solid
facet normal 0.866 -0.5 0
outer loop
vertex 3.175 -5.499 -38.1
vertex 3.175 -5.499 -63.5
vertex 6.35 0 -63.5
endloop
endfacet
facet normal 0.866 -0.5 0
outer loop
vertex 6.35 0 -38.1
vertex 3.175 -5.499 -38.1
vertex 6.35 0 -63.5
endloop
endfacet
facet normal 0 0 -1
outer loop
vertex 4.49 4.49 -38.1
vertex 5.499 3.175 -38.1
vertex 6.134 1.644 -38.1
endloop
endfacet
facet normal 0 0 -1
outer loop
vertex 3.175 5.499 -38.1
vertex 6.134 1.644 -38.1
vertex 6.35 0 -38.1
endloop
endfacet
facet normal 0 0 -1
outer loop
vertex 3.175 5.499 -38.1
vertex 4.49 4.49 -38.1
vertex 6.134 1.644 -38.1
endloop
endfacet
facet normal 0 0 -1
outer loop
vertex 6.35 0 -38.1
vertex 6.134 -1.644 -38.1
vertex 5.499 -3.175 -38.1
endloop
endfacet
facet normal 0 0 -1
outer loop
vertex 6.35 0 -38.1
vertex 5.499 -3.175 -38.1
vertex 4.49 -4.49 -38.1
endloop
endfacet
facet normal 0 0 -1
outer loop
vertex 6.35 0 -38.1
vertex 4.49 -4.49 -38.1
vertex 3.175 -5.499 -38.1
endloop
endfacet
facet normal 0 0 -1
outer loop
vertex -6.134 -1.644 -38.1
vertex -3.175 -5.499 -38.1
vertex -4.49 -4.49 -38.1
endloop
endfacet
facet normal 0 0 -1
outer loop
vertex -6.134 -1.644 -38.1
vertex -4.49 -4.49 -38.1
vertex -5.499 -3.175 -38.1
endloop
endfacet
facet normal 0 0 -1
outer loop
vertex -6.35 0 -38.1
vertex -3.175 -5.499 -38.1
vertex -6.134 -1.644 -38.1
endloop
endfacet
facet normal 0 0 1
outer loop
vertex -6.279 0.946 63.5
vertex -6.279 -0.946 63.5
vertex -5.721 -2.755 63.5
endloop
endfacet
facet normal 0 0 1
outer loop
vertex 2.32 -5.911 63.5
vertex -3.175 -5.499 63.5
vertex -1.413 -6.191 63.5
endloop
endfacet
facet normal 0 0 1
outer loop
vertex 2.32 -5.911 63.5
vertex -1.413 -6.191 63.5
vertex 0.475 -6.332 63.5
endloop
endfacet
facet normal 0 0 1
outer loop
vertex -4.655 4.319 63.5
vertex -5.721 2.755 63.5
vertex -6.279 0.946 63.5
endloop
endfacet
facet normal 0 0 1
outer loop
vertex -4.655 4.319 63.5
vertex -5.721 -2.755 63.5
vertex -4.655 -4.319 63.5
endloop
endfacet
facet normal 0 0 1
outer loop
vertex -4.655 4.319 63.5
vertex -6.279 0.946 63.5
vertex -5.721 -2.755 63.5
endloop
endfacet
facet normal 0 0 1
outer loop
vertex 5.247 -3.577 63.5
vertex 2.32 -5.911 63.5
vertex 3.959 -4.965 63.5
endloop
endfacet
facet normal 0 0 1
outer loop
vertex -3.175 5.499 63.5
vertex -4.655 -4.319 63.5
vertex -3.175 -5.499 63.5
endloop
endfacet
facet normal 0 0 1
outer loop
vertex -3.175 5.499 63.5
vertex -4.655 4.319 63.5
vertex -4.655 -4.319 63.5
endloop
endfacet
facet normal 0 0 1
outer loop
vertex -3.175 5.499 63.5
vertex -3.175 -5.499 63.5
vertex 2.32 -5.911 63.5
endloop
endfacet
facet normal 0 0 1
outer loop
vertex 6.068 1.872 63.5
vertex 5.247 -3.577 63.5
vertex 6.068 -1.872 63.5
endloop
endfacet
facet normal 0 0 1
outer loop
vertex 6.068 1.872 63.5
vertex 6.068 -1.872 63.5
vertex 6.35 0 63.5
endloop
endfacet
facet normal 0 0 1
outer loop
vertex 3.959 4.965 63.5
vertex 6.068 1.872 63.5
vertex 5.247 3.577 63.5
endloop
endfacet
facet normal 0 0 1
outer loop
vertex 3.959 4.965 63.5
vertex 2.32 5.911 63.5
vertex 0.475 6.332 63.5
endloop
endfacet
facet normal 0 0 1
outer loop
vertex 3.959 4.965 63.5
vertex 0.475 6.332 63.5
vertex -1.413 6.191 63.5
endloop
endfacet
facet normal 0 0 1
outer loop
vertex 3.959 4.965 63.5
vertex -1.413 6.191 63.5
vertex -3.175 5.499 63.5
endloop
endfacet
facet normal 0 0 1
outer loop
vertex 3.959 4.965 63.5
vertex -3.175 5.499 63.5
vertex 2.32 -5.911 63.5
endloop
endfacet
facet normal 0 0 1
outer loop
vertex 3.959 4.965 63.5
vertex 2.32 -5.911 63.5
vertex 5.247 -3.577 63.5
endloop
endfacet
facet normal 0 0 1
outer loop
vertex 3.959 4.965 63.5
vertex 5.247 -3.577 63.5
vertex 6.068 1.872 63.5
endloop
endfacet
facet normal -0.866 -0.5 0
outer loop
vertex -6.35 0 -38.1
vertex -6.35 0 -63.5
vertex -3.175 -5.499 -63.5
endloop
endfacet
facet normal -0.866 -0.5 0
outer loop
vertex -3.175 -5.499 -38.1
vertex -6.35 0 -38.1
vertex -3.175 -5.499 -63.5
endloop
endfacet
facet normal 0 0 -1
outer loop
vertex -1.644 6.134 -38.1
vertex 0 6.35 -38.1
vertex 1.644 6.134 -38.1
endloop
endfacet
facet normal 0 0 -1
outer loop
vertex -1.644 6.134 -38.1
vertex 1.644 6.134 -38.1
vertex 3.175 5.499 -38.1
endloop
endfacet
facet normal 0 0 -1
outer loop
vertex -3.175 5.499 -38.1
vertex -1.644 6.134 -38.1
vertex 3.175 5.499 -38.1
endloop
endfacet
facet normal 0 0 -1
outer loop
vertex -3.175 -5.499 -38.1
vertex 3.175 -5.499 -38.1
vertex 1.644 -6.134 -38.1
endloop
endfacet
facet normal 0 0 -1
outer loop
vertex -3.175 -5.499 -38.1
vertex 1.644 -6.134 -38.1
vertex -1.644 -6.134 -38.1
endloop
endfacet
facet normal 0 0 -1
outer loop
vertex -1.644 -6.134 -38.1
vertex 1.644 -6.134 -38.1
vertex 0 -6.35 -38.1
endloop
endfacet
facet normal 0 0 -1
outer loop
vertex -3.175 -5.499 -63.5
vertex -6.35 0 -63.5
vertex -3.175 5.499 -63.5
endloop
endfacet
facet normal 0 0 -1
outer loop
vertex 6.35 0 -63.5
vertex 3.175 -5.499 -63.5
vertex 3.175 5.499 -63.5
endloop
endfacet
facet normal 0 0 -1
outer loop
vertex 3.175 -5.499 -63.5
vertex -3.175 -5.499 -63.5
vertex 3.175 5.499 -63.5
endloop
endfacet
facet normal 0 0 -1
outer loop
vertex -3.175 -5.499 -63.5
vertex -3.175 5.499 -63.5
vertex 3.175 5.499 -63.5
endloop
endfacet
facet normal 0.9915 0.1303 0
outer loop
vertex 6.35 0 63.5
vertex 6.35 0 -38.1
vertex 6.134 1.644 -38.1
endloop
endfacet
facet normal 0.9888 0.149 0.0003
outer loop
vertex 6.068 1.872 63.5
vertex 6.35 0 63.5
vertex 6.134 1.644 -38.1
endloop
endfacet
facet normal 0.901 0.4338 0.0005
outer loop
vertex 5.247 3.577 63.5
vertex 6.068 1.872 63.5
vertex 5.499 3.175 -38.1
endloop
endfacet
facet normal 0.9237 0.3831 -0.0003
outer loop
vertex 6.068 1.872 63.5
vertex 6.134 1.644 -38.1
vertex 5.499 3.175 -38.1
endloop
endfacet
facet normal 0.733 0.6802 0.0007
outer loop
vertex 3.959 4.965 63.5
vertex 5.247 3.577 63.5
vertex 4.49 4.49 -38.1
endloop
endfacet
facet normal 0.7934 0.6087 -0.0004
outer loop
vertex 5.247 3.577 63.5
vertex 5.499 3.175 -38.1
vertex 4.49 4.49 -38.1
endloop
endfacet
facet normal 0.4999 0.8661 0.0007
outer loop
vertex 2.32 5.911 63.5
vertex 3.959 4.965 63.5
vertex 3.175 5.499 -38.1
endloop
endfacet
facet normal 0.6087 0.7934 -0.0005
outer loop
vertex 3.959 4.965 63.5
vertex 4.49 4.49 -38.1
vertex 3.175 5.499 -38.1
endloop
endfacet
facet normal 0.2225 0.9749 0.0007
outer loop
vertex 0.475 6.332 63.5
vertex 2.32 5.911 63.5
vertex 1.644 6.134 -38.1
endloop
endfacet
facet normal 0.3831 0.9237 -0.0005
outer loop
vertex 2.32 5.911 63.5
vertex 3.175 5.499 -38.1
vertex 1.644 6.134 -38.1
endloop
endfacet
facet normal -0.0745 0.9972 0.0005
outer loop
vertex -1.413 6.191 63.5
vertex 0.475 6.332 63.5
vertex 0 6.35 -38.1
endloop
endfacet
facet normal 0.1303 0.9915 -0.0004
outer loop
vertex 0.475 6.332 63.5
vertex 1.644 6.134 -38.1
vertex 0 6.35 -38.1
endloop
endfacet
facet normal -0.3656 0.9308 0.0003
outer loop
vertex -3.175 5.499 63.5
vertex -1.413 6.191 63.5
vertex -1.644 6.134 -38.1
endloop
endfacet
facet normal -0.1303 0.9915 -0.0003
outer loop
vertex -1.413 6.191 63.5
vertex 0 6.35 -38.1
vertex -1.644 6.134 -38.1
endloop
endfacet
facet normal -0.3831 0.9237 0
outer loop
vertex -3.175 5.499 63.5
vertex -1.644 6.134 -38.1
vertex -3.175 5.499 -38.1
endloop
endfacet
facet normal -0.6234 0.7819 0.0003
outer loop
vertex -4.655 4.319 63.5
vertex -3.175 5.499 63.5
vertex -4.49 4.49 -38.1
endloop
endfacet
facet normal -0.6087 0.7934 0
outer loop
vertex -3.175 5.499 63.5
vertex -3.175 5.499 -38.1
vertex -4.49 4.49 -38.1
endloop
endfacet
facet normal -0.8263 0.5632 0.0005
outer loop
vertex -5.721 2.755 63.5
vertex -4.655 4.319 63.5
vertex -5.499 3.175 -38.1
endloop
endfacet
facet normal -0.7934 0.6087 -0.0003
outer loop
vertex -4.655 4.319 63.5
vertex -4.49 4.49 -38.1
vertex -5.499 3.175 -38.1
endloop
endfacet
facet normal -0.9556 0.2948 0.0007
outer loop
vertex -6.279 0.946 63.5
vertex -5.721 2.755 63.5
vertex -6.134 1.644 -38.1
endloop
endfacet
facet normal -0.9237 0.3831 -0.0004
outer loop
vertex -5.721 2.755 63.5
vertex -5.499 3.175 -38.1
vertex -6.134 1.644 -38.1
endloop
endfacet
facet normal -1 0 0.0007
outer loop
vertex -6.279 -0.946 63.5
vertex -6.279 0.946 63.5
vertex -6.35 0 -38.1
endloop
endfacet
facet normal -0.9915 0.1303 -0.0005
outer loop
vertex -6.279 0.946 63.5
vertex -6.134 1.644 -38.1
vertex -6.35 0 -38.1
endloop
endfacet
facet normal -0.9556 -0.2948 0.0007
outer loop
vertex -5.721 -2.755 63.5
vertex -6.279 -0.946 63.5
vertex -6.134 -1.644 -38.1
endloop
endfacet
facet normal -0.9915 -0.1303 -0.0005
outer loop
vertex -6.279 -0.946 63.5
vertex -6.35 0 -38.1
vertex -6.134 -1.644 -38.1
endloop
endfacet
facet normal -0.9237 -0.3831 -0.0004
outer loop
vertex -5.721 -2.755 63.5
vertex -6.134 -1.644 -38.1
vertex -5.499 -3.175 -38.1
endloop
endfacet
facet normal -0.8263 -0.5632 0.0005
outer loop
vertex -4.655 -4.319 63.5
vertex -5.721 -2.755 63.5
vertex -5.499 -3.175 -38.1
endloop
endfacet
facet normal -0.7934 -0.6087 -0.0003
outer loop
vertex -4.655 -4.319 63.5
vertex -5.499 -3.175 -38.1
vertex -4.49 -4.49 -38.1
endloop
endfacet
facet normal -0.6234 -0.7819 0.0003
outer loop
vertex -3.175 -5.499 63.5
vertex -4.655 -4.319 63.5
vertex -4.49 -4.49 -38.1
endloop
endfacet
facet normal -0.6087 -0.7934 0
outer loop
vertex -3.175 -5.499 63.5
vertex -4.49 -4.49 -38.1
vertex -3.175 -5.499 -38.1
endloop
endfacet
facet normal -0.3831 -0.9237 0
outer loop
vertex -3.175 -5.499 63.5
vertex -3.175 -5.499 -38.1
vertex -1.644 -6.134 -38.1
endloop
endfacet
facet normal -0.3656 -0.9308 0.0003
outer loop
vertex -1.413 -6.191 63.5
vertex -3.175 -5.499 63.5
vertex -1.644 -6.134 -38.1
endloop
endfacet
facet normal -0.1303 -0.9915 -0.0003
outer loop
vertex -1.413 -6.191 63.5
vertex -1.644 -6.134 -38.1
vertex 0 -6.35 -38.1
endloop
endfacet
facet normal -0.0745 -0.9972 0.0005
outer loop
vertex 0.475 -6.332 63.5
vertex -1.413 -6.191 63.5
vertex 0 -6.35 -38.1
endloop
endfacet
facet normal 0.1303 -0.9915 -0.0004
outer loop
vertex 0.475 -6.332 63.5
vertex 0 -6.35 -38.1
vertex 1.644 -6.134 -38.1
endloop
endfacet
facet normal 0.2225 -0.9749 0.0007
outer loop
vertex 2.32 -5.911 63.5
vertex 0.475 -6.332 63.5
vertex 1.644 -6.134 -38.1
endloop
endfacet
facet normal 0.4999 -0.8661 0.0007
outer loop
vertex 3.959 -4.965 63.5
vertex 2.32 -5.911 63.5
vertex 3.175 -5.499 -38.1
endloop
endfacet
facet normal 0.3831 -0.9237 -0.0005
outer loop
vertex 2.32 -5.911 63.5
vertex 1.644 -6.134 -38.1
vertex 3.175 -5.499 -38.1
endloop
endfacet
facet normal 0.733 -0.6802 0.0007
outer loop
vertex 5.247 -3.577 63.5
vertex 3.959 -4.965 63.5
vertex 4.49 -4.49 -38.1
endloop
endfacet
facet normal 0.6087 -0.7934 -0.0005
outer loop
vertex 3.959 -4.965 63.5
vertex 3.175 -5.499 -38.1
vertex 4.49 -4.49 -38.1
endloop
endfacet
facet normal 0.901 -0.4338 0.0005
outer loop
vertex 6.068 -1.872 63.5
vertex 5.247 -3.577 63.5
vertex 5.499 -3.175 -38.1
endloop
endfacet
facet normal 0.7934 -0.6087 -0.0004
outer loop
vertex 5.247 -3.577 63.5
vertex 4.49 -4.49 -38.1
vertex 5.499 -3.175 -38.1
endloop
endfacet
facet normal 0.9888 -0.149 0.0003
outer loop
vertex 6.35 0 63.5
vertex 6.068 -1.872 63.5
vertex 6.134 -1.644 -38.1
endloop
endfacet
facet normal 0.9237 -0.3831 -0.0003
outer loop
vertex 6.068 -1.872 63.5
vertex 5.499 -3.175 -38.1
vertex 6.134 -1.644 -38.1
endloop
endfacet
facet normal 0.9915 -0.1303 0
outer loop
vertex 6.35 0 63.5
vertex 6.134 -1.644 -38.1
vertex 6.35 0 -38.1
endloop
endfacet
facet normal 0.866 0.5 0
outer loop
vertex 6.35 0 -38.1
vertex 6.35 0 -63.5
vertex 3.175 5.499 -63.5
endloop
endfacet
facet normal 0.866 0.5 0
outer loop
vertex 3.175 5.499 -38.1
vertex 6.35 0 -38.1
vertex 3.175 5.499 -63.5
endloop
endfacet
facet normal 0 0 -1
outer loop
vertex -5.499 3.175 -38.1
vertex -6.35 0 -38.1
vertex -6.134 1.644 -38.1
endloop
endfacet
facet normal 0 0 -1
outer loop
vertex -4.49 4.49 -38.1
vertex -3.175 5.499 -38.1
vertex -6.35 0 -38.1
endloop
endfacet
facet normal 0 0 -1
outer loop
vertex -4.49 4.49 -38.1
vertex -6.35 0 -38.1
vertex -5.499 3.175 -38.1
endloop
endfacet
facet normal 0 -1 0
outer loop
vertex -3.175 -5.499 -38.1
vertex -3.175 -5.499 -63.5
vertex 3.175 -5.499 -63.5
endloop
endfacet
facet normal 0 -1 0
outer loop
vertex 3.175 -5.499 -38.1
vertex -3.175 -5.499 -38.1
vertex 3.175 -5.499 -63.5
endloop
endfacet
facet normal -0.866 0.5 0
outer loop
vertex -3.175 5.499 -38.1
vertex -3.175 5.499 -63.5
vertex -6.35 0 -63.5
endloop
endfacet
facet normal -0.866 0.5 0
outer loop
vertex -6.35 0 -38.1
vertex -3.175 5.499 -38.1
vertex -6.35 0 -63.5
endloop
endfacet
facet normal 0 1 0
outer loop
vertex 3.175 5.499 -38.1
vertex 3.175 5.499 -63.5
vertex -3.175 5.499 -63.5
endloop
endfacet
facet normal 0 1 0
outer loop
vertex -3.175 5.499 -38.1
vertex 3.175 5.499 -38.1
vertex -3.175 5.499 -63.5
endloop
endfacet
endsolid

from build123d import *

# Parameters (mm, degrees)
BOSS_EXTRUDE1_DEPTH      = 63.5
BOSS_EXTRUDE1_DEPTH_BACK = 63.5
SKETCH1_R                = 6.35
CUT_EXTRUDE1_DEPTH       = 25.4


with BuildPart() as part:
    # Sketch1 → Boss-Extrude1 (new, two sides: drawn at the far end of the back side and taken through both)
    with BuildSketch(Plane.XY.offset(-BOSS_EXTRUDE1_DEPTH_BACK)):
        Circle(SKETCH1_R)
    extrude(amount=BOSS_EXTRUDE1_DEPTH + BOSS_EXTRUDE1_DEPTH_BACK)

    # Sketch2 → Cut-Extrude1 (cut)
    with BuildSketch(Plane(origin=(0, 0, -63.5), x_dir=(-1, 0, 0), z_dir=(0, 0, -1))):
        with BuildLine():
            ThreePointArc((6.35, 0), (5.499261314, 3.175), (3.175, 5.499261314))
            Line((3.175, 5.499261314), (6.35, 0))
        make_face()
        with BuildLine():
            Line((-3.175, 5.499261314), (3.175, 5.499261314))
            ThreePointArc((3.175, 5.499261314), (0, 6.35), (-3.175, 5.499261314))
        make_face()
        with BuildLine():
            Line((-6.35, 0), (-3.175, 5.499261314))
            ThreePointArc((-3.175, 5.499261314), (-5.499261314, 3.175), (-6.35, 0))
        make_face()
        with BuildLine():
            ThreePointArc((3.175, -5.499261314), (5.499261314, -3.175), (6.35, 0))
            Line((6.35, 0), (3.175, -5.499261314))
        make_face()
        with BuildLine():
            Line((-3.175, -5.499261314), (-6.35, 0))
            ThreePointArc((-6.35, 0), (-5.499261314, -3.175), (-3.175, -5.499261314))
        make_face()
        with BuildLine():
            ThreePointArc((-3.175, -5.499261314), (0, -6.35), (3.175, -5.499261314))
            Line((3.175, -5.499261314), (-3.175, -5.499261314))
        make_face()
    extrude(amount=-CUT_EXTRUDE1_DEPTH, mode=Mode.SUBTRACT)


solid = part.part
